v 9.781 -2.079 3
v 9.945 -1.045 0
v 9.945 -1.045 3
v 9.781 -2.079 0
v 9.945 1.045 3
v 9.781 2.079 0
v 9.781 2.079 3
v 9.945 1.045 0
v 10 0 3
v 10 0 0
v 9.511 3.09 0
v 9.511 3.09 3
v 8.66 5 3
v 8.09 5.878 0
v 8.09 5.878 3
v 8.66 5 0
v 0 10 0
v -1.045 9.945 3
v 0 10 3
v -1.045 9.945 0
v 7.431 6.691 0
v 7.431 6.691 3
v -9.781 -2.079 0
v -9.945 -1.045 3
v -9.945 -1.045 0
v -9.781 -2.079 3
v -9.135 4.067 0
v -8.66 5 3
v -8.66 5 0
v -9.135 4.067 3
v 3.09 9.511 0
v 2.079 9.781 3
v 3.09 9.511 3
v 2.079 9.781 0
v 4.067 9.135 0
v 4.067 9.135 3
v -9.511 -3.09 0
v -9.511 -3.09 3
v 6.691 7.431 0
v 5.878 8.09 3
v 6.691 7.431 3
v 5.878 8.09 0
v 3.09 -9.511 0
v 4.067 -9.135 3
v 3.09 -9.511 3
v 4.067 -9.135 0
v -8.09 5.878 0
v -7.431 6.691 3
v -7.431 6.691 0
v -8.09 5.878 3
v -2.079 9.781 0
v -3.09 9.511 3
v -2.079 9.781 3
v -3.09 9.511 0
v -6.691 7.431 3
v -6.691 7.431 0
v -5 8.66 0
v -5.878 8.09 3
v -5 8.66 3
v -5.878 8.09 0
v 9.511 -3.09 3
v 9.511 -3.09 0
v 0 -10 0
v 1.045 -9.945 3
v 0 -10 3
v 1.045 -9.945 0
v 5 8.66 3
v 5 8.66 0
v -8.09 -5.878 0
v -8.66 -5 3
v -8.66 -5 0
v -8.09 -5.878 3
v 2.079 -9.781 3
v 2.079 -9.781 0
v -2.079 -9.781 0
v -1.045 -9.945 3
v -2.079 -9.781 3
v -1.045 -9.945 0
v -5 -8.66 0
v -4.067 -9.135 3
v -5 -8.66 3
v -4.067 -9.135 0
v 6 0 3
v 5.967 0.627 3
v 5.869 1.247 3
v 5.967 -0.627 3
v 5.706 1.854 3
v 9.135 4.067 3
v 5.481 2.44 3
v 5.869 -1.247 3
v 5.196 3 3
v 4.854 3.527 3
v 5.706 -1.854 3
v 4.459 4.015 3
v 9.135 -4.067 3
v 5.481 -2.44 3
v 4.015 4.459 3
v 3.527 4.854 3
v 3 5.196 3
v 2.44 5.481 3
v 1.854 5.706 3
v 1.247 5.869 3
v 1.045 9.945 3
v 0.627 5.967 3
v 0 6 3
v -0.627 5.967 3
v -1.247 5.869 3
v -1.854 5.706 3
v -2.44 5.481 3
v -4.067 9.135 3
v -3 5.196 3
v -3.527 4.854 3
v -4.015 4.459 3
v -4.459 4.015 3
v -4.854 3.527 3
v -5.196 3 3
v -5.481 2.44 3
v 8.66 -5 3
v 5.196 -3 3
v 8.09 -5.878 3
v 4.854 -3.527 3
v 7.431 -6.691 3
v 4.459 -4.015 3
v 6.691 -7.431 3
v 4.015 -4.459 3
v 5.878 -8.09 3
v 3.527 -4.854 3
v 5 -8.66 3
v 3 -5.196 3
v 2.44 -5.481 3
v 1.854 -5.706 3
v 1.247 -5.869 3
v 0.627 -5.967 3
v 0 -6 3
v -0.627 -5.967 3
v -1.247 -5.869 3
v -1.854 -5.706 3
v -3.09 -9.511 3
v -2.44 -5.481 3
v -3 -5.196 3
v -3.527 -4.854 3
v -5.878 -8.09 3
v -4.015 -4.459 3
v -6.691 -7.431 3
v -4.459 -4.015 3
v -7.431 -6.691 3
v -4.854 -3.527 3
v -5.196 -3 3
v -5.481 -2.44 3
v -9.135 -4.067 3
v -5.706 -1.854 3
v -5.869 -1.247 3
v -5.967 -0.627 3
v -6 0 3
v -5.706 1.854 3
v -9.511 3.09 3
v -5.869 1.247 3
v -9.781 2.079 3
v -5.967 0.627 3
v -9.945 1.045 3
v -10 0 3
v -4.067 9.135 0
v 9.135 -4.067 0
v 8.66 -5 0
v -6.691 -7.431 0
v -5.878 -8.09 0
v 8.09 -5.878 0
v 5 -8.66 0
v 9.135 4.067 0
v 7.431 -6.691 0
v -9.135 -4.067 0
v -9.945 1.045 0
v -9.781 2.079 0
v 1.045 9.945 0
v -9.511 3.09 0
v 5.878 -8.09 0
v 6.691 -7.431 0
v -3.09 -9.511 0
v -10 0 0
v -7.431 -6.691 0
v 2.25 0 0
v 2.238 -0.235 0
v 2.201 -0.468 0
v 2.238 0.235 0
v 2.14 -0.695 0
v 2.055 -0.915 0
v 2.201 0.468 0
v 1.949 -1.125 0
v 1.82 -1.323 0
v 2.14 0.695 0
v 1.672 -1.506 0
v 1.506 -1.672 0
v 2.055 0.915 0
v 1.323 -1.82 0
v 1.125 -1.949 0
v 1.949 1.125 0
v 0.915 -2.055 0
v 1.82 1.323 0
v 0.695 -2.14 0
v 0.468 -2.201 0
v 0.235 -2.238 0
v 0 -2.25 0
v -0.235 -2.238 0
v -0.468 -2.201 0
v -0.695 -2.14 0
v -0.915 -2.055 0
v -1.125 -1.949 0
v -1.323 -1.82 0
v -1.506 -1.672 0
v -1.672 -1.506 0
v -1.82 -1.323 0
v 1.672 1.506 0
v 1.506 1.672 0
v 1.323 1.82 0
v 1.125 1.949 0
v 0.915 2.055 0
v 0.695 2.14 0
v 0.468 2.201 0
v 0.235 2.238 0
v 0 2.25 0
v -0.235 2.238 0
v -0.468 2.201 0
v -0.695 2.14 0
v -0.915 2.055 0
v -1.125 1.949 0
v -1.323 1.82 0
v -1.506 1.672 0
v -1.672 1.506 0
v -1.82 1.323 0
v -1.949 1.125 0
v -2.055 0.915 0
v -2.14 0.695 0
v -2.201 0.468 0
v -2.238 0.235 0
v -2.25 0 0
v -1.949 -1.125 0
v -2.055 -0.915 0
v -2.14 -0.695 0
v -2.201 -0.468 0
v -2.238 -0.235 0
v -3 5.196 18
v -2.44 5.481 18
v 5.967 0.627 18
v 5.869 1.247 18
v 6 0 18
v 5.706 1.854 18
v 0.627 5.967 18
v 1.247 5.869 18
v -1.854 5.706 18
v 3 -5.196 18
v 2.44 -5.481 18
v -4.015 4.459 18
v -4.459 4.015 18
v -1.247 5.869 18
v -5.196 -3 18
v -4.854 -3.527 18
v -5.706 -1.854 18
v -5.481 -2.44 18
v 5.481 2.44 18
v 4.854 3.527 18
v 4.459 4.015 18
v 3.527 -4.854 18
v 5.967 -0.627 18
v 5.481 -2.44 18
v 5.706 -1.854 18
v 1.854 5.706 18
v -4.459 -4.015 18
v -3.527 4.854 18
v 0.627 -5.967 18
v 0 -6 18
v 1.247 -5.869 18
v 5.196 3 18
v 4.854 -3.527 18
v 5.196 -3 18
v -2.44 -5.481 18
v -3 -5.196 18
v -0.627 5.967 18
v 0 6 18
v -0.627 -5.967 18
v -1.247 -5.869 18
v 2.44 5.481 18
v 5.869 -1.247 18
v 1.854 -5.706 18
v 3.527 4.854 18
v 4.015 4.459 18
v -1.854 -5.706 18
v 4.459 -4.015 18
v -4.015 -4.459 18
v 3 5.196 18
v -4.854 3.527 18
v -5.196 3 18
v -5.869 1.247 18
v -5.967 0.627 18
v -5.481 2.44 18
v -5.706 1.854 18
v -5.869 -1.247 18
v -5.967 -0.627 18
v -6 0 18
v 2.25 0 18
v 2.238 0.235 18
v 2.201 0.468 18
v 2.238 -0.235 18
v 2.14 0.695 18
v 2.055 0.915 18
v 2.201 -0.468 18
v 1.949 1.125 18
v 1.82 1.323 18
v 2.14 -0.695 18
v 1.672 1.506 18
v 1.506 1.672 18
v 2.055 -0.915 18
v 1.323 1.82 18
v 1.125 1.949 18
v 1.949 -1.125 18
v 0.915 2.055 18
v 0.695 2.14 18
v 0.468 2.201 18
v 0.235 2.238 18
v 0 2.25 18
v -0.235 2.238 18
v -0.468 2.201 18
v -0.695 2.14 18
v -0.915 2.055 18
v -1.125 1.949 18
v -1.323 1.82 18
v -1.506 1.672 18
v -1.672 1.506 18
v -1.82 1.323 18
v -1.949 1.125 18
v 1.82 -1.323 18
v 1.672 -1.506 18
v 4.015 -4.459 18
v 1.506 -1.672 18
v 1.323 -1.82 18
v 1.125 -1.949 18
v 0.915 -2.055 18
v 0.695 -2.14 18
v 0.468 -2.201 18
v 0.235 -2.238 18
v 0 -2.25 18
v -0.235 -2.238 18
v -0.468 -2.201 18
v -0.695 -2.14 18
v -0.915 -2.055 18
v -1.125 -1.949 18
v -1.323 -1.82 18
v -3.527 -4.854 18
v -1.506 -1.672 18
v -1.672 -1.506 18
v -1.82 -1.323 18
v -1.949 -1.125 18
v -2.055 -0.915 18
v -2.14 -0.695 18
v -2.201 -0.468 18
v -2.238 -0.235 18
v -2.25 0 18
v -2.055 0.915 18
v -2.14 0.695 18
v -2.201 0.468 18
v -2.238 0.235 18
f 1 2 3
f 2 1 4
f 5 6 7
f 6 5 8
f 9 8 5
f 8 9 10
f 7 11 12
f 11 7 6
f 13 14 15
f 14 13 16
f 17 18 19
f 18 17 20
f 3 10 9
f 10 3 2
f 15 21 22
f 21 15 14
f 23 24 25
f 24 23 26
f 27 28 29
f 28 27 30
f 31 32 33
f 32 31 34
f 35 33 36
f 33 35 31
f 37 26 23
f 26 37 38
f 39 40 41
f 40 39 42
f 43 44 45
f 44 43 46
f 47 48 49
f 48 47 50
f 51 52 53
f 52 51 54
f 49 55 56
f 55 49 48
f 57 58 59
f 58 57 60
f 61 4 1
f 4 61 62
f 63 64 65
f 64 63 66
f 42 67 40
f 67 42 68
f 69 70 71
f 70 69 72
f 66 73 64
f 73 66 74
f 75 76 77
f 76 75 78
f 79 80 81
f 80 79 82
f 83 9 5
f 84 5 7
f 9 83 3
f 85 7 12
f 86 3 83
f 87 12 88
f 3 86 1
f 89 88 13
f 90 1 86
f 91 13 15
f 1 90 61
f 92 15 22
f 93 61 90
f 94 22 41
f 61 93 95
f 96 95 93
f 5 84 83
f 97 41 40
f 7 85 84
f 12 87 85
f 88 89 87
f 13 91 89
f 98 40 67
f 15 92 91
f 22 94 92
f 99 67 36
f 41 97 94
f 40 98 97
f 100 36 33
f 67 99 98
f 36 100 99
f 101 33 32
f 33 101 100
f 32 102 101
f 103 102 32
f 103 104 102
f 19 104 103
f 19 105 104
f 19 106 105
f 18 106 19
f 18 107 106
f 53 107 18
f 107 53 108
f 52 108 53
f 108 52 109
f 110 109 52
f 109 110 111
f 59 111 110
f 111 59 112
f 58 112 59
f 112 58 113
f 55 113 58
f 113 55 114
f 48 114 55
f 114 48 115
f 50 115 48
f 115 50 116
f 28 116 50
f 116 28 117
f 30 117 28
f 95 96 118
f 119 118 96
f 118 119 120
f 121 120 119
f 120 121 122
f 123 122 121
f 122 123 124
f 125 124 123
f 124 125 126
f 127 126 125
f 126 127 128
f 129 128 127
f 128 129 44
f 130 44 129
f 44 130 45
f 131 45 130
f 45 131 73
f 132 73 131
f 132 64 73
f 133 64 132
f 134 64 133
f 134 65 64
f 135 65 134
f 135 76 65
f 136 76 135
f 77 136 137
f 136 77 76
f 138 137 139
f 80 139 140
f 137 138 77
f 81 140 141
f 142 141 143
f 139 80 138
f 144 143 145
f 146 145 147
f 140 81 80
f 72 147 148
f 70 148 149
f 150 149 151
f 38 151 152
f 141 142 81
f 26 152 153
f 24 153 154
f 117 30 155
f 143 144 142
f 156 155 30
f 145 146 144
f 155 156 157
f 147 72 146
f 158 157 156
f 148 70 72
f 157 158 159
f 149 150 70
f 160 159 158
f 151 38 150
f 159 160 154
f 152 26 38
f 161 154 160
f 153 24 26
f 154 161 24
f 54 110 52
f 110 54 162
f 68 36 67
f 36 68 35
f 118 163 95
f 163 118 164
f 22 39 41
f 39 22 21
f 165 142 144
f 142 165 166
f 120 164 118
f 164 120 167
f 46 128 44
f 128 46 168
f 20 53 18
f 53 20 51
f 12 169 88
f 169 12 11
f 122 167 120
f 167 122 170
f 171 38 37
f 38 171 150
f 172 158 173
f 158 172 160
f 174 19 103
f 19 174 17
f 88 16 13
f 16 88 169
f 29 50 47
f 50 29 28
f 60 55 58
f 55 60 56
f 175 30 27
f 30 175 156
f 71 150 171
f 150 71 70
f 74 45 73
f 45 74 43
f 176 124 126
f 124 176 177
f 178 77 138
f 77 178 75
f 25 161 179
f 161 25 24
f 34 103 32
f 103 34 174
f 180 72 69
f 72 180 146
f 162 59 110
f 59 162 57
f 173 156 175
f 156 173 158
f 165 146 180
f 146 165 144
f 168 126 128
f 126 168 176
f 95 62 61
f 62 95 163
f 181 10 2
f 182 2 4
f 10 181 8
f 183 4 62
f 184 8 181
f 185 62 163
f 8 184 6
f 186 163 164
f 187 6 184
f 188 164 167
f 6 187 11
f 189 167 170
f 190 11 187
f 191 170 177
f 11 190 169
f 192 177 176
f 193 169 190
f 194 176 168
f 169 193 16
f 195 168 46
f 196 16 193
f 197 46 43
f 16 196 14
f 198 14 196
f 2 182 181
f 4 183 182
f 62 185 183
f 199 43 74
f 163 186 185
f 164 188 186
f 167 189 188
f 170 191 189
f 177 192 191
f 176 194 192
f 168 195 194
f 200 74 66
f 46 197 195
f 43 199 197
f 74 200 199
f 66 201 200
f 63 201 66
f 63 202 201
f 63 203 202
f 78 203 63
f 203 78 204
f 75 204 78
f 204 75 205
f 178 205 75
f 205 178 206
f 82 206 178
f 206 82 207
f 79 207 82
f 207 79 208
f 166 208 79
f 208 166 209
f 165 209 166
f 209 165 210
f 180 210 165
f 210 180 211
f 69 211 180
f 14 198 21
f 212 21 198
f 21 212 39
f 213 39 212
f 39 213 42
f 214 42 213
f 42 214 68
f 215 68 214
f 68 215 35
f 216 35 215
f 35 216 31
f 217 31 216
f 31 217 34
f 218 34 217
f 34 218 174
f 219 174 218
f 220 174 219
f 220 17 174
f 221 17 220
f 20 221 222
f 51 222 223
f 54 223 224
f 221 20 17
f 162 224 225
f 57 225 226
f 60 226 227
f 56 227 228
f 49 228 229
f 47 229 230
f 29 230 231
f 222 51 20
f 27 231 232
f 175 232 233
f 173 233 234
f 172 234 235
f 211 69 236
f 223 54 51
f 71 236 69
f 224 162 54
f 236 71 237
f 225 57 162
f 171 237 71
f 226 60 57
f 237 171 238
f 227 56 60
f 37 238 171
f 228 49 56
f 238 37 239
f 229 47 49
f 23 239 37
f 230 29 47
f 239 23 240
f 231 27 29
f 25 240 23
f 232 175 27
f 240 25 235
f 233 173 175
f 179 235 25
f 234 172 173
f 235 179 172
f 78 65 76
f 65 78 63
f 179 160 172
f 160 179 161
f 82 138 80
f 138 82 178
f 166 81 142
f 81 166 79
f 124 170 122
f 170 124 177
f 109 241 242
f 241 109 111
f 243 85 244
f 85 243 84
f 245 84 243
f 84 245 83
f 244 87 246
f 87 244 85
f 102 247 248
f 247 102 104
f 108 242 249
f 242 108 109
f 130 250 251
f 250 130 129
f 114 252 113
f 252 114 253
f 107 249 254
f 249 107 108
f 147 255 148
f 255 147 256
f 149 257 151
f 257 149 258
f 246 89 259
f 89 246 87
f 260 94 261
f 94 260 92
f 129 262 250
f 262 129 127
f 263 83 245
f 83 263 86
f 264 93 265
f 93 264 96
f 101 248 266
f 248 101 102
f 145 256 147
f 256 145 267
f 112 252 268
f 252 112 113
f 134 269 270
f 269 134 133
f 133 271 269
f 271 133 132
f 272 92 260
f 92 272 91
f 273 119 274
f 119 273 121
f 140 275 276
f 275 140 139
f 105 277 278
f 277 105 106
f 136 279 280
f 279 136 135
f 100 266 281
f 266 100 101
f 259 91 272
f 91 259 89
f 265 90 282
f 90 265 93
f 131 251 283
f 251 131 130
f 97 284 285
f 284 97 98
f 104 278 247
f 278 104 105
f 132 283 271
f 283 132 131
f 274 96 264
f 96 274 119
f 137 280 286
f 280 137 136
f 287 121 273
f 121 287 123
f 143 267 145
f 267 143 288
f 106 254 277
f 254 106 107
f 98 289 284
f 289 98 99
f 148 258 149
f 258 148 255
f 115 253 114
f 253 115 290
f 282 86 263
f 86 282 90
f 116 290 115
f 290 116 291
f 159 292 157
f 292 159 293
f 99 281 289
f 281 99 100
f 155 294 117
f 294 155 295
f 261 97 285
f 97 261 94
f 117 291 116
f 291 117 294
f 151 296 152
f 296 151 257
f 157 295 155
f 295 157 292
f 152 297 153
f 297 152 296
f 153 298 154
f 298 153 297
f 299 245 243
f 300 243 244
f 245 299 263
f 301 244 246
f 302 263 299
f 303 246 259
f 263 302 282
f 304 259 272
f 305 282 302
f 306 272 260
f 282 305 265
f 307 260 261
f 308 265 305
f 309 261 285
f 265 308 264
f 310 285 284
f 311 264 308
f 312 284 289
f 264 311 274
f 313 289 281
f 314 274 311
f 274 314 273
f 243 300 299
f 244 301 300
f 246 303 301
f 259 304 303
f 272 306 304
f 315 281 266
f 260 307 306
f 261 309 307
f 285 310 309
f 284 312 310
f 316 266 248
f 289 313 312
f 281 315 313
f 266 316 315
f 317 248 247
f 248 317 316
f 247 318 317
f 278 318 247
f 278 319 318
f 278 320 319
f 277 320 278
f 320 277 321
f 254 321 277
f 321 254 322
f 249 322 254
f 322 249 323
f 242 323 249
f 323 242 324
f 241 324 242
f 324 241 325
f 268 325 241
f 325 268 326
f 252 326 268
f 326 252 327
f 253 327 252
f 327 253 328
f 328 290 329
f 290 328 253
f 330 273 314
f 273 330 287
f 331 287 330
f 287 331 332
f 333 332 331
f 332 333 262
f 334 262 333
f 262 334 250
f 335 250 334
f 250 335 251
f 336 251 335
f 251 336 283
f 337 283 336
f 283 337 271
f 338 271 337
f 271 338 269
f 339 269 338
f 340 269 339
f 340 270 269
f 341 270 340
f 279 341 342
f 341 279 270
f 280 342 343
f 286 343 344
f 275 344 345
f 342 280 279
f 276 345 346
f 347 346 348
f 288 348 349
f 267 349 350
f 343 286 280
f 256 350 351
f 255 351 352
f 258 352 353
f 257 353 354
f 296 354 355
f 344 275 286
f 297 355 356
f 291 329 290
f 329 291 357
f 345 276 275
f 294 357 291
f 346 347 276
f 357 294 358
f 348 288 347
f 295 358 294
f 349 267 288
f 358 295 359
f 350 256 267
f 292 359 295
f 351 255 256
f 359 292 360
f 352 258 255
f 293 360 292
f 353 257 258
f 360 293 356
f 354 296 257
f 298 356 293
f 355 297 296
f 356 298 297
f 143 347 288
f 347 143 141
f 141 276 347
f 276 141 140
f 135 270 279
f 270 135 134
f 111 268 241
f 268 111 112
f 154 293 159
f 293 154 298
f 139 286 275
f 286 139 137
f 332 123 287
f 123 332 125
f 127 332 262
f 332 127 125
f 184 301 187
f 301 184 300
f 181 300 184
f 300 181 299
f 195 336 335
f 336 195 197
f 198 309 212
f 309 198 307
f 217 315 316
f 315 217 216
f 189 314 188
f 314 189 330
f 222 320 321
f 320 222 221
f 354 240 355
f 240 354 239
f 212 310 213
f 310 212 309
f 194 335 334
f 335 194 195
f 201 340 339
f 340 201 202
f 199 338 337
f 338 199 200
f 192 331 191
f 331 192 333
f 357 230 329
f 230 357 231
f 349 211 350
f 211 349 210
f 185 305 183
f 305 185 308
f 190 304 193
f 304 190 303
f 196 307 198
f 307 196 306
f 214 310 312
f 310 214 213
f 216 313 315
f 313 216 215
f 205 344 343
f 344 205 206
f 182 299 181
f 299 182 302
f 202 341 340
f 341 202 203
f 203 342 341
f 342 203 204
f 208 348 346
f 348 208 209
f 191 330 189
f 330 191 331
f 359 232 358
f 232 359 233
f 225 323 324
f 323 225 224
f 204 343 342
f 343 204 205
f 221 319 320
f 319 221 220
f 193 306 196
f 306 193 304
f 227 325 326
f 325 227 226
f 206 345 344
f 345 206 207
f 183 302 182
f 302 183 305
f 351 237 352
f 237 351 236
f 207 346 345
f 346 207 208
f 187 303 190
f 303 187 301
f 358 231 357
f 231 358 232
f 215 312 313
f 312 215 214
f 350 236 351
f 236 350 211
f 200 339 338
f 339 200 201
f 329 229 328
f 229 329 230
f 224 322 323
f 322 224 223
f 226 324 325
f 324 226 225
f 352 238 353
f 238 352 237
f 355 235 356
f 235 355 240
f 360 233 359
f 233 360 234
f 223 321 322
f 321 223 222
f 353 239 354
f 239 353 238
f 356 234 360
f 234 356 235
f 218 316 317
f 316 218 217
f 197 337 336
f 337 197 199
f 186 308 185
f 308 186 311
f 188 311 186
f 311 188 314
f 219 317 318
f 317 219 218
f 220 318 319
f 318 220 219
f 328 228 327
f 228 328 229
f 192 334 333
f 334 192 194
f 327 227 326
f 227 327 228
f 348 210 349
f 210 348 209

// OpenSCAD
// Cable gland body for 4 mm cable.
$fn = 60;
eps = 0.02;
cable_d = 4;
body_d = 12;
body_l = 18;
flange_d = body_d + 8;
flange_t = 3;
difference() {
    union() { cylinder(d = flange_d, h = flange_t); cylinder(d = body_d, h = body_l); }
    translate([0, 0, -eps]) cylinder(d = cable_d + 0.5, h = body_l + 2 * eps);
}
